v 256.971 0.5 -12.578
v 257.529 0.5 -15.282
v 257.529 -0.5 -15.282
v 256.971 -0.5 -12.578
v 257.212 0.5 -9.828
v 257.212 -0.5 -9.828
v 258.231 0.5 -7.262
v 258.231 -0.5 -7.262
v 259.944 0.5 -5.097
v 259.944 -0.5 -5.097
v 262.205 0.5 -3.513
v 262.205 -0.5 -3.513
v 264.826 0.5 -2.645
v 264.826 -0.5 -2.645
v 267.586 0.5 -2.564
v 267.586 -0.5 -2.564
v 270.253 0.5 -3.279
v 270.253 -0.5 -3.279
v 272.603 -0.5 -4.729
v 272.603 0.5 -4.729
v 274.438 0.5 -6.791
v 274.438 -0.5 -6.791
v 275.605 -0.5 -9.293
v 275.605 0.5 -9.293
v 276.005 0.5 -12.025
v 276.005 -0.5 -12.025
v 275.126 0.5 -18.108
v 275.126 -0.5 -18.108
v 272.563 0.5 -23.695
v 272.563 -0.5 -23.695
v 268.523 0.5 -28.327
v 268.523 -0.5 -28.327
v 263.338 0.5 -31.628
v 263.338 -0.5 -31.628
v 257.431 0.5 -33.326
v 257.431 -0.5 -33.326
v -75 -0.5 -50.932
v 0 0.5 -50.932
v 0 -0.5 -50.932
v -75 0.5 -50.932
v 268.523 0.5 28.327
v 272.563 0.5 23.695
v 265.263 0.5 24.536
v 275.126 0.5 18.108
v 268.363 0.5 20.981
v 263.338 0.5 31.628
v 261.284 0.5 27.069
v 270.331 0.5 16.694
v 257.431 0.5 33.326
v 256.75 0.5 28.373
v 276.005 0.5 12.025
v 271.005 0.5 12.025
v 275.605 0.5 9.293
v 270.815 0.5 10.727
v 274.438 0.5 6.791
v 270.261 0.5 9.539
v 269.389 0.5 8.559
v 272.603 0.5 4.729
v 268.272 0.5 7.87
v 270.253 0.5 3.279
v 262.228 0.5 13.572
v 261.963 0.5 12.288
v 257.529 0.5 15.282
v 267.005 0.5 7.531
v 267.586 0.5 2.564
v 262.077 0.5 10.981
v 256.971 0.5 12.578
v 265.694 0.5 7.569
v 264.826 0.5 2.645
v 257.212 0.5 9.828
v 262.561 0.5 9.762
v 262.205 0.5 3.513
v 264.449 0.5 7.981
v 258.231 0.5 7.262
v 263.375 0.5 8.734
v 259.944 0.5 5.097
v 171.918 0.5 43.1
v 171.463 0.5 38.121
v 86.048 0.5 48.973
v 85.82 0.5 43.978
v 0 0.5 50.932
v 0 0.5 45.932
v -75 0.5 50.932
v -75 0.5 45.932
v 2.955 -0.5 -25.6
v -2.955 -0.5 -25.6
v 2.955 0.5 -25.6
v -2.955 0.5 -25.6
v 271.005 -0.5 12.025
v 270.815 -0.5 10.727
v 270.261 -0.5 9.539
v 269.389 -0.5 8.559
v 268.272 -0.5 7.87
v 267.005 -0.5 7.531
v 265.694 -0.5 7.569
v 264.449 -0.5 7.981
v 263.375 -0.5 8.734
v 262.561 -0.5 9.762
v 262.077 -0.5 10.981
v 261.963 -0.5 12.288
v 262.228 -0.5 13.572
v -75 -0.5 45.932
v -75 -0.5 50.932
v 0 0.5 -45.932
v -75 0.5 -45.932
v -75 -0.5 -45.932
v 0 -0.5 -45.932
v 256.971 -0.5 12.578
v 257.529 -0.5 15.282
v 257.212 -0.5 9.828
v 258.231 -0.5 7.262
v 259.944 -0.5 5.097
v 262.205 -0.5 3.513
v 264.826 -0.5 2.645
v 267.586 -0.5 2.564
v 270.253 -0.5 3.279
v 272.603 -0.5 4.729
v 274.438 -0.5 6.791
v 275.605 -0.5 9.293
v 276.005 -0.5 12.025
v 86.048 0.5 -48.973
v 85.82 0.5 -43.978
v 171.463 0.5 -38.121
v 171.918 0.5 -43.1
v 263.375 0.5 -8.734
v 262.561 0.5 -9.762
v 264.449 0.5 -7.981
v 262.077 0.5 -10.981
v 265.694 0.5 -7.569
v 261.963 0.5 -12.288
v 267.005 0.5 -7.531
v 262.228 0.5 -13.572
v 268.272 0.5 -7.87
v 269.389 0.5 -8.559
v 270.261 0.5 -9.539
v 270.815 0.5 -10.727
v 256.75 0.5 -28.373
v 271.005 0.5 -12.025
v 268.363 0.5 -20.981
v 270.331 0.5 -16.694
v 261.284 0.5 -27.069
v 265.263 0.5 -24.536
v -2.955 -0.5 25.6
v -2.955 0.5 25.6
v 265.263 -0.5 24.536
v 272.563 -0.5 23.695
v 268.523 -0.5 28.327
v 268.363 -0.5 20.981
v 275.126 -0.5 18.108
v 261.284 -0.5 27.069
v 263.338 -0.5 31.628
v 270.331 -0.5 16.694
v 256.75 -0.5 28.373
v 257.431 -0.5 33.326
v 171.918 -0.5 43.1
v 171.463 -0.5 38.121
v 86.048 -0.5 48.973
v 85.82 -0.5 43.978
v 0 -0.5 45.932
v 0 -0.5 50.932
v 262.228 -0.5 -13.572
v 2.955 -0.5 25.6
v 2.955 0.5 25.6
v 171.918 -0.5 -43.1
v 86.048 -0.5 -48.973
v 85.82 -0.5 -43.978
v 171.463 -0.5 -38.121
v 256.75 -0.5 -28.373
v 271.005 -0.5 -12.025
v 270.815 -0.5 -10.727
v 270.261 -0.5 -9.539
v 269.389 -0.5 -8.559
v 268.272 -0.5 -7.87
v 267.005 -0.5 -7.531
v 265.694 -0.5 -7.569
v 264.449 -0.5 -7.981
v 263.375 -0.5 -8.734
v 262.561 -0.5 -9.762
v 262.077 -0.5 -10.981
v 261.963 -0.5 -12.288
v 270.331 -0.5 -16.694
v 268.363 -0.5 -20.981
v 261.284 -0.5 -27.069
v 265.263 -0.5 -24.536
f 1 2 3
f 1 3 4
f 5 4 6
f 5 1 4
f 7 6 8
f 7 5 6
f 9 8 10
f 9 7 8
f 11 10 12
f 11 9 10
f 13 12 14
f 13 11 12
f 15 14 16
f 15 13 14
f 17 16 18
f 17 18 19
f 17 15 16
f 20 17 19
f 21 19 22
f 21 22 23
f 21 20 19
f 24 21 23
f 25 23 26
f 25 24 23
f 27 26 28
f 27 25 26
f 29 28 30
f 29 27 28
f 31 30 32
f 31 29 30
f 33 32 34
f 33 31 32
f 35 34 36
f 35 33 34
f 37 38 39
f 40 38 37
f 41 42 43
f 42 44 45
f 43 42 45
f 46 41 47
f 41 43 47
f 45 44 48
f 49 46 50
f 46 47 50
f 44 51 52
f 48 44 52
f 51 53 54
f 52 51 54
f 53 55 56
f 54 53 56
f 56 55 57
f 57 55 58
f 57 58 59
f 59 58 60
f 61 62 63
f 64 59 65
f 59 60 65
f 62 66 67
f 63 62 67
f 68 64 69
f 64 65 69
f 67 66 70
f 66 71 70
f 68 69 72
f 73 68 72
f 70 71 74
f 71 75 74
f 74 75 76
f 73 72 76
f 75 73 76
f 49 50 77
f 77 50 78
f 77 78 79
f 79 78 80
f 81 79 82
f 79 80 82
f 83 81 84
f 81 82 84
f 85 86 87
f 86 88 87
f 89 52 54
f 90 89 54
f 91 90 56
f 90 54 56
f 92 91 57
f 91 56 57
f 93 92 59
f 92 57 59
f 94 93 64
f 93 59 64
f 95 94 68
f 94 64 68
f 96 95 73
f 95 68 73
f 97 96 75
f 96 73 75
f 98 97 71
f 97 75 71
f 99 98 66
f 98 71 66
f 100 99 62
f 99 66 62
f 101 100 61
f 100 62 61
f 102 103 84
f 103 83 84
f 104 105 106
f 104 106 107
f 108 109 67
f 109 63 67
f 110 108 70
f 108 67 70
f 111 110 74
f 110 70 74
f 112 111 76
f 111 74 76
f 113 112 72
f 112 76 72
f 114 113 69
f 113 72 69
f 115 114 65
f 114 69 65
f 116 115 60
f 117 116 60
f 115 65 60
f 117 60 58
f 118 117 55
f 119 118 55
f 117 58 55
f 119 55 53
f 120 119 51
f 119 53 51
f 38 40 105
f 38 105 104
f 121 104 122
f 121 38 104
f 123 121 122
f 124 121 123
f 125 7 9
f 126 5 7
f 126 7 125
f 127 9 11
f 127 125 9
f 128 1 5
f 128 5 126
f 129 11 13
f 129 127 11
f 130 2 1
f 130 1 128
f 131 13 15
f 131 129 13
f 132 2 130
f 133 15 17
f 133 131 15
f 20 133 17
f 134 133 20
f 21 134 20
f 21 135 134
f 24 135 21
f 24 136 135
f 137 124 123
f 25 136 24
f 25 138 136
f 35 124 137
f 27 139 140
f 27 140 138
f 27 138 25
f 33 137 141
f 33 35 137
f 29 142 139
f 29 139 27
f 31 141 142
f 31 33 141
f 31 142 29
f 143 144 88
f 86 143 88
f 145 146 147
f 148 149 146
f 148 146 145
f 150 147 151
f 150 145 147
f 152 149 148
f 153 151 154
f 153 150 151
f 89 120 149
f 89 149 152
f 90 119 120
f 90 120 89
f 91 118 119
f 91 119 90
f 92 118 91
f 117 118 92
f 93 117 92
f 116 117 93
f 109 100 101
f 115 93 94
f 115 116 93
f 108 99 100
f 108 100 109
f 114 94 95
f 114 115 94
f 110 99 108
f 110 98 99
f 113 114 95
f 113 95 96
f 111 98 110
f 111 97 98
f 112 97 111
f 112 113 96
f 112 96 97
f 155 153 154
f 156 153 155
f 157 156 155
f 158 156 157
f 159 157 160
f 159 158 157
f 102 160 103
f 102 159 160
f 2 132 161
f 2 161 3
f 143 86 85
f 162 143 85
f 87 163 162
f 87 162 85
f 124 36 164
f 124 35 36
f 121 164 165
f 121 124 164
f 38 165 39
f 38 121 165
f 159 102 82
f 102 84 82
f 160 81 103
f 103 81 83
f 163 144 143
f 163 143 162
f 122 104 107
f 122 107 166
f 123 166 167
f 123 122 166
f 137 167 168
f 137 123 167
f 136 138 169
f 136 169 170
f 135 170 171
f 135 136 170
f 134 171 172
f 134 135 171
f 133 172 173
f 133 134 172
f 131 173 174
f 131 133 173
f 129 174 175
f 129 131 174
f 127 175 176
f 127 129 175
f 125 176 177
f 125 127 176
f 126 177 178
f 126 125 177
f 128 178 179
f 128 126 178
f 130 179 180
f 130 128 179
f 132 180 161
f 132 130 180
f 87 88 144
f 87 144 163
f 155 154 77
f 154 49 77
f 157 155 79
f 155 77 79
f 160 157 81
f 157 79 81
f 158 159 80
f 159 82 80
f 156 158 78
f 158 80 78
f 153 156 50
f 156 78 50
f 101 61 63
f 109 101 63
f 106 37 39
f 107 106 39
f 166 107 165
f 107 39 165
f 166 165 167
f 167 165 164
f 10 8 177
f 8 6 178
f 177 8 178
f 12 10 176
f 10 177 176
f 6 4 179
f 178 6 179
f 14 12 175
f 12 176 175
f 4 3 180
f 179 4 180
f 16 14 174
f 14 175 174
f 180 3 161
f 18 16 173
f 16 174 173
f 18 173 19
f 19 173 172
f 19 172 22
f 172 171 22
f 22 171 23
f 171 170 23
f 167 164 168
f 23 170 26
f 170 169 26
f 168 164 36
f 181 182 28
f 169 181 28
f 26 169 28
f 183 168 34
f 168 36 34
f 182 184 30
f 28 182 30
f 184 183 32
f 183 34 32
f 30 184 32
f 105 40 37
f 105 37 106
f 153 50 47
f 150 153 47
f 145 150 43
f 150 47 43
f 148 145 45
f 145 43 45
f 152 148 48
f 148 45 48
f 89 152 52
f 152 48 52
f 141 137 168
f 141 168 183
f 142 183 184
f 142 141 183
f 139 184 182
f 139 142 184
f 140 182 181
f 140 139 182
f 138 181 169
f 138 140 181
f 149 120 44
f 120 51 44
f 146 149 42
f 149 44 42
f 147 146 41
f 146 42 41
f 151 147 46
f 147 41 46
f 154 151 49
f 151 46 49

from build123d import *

# Parameters (mm, degrees)
BOSS_EXTRUDE1_DEPTH   = 0.5
BOSS_EXTRUDE1_2_DEPTH = 0.5
SKETCH1_W             = 5.91
SKETCH1_H             = 51.2
BOSS_EXTRUDE1_3_DEPTH = 0.5


with BuildPart() as part:
    # Sketch1 → Boss-Extrude1 (new, symmetric)
    with BuildSketch(Plane(origin=(0, 0, 0), x_dir=(1, 0, 0), z_dir=(0, 1, 0))):
        with BuildLine():
            Line((0, 50.931890821), (-75, 50.931890821))
            Line((-75, 50.931890821), (-75, 45.931890821))
            Line((-75, 45.931890821), (0, 45.931890821))
            ThreePointArc((0, 45.931890821), (128.67499242, 41.536963002), (256.750244878, 28.372663821))
            ThreePointArc((256.750244878, 28.372663821), (266.940818335, 22.869862332), (271.005, 12.025))
            ThreePointArc((271.005, 12.025), (265.694357424, 7.568724566), (262.227810722, 13.572420868))
            Line((262.227810722, 13.572420868), (257.529259033, 15.28227818))
            ThreePointArc((257.529259033, 15.28227818), (264.826244079, 2.644663313), (276.005, 12.025))
            ThreePointArc((276.005, 12.025), (270.709345615, 26.155924129), (257.430964024, 33.326109233))
            ThreePointArc((257.430964024, 33.326109233), (129.016147035, 46.525310778), (0, 50.931890821))
        make_face()
    extrude(amount=BOSS_EXTRUDE1_DEPTH, both=True)


with BuildPart() as body_2:
    # Sketch1 → Boss-Extrude1 2 (new, symmetric)
    with BuildSketch(Plane(origin=(0, 0, 0), x_dir=(1, 0, 0), z_dir=(0, 1, 0))):
        with BuildLine():
            Line((262.227810722, -13.572420868), (257.529259033, -15.28227818))
            ThreePointArc((257.529259033, -15.28227818), (264.826244079, -2.644663313), (276.005, -12.025))
            ThreePointArc((276.005, -12.025), (270.709345615, -26.155924129), (257.430964024, -33.326109233))
            ThreePointArc((257.430964024, -33.326109233), (129.016147035, -46.525310778), (0, -50.931890821))
            Line((0, -50.931890821), (-75, -50.931890821))
            Line((-75, -50.931890821), (-75, -45.931890821))
            Line((-75, -45.931890821), (0, -45.931890821))
            ThreePointArc((0, -45.931890821), (128.67499242, -41.536963002), (256.750244878, -28.372663821))
            ThreePointArc((256.750244878, -28.372663821), (266.940818335, -22.869862332), (271.005, -12.025))
            ThreePointArc((271.005, -12.025), (265.694357424, -7.568724566), (262.227810722, -13.572420868))
        make_face()
    extrude(amount=BOSS_EXTRUDE1_2_DEPTH, both=True)


with BuildPart() as body_3:
    # Sketch1 → Boss-Extrude1 3 (new, symmetric)
    with BuildSketch(Plane(origin=(0, 0, 0), x_dir=(1, 0, 0), z_dir=(0, 1, 0))):
        Rectangle(SKETCH1_W, SKETCH1_H)
    extrude(amount=BOSS_EXTRUDE1_3_DEPTH, both=True)


solid = Compound([part.part, body_2.part, body_3.part])
